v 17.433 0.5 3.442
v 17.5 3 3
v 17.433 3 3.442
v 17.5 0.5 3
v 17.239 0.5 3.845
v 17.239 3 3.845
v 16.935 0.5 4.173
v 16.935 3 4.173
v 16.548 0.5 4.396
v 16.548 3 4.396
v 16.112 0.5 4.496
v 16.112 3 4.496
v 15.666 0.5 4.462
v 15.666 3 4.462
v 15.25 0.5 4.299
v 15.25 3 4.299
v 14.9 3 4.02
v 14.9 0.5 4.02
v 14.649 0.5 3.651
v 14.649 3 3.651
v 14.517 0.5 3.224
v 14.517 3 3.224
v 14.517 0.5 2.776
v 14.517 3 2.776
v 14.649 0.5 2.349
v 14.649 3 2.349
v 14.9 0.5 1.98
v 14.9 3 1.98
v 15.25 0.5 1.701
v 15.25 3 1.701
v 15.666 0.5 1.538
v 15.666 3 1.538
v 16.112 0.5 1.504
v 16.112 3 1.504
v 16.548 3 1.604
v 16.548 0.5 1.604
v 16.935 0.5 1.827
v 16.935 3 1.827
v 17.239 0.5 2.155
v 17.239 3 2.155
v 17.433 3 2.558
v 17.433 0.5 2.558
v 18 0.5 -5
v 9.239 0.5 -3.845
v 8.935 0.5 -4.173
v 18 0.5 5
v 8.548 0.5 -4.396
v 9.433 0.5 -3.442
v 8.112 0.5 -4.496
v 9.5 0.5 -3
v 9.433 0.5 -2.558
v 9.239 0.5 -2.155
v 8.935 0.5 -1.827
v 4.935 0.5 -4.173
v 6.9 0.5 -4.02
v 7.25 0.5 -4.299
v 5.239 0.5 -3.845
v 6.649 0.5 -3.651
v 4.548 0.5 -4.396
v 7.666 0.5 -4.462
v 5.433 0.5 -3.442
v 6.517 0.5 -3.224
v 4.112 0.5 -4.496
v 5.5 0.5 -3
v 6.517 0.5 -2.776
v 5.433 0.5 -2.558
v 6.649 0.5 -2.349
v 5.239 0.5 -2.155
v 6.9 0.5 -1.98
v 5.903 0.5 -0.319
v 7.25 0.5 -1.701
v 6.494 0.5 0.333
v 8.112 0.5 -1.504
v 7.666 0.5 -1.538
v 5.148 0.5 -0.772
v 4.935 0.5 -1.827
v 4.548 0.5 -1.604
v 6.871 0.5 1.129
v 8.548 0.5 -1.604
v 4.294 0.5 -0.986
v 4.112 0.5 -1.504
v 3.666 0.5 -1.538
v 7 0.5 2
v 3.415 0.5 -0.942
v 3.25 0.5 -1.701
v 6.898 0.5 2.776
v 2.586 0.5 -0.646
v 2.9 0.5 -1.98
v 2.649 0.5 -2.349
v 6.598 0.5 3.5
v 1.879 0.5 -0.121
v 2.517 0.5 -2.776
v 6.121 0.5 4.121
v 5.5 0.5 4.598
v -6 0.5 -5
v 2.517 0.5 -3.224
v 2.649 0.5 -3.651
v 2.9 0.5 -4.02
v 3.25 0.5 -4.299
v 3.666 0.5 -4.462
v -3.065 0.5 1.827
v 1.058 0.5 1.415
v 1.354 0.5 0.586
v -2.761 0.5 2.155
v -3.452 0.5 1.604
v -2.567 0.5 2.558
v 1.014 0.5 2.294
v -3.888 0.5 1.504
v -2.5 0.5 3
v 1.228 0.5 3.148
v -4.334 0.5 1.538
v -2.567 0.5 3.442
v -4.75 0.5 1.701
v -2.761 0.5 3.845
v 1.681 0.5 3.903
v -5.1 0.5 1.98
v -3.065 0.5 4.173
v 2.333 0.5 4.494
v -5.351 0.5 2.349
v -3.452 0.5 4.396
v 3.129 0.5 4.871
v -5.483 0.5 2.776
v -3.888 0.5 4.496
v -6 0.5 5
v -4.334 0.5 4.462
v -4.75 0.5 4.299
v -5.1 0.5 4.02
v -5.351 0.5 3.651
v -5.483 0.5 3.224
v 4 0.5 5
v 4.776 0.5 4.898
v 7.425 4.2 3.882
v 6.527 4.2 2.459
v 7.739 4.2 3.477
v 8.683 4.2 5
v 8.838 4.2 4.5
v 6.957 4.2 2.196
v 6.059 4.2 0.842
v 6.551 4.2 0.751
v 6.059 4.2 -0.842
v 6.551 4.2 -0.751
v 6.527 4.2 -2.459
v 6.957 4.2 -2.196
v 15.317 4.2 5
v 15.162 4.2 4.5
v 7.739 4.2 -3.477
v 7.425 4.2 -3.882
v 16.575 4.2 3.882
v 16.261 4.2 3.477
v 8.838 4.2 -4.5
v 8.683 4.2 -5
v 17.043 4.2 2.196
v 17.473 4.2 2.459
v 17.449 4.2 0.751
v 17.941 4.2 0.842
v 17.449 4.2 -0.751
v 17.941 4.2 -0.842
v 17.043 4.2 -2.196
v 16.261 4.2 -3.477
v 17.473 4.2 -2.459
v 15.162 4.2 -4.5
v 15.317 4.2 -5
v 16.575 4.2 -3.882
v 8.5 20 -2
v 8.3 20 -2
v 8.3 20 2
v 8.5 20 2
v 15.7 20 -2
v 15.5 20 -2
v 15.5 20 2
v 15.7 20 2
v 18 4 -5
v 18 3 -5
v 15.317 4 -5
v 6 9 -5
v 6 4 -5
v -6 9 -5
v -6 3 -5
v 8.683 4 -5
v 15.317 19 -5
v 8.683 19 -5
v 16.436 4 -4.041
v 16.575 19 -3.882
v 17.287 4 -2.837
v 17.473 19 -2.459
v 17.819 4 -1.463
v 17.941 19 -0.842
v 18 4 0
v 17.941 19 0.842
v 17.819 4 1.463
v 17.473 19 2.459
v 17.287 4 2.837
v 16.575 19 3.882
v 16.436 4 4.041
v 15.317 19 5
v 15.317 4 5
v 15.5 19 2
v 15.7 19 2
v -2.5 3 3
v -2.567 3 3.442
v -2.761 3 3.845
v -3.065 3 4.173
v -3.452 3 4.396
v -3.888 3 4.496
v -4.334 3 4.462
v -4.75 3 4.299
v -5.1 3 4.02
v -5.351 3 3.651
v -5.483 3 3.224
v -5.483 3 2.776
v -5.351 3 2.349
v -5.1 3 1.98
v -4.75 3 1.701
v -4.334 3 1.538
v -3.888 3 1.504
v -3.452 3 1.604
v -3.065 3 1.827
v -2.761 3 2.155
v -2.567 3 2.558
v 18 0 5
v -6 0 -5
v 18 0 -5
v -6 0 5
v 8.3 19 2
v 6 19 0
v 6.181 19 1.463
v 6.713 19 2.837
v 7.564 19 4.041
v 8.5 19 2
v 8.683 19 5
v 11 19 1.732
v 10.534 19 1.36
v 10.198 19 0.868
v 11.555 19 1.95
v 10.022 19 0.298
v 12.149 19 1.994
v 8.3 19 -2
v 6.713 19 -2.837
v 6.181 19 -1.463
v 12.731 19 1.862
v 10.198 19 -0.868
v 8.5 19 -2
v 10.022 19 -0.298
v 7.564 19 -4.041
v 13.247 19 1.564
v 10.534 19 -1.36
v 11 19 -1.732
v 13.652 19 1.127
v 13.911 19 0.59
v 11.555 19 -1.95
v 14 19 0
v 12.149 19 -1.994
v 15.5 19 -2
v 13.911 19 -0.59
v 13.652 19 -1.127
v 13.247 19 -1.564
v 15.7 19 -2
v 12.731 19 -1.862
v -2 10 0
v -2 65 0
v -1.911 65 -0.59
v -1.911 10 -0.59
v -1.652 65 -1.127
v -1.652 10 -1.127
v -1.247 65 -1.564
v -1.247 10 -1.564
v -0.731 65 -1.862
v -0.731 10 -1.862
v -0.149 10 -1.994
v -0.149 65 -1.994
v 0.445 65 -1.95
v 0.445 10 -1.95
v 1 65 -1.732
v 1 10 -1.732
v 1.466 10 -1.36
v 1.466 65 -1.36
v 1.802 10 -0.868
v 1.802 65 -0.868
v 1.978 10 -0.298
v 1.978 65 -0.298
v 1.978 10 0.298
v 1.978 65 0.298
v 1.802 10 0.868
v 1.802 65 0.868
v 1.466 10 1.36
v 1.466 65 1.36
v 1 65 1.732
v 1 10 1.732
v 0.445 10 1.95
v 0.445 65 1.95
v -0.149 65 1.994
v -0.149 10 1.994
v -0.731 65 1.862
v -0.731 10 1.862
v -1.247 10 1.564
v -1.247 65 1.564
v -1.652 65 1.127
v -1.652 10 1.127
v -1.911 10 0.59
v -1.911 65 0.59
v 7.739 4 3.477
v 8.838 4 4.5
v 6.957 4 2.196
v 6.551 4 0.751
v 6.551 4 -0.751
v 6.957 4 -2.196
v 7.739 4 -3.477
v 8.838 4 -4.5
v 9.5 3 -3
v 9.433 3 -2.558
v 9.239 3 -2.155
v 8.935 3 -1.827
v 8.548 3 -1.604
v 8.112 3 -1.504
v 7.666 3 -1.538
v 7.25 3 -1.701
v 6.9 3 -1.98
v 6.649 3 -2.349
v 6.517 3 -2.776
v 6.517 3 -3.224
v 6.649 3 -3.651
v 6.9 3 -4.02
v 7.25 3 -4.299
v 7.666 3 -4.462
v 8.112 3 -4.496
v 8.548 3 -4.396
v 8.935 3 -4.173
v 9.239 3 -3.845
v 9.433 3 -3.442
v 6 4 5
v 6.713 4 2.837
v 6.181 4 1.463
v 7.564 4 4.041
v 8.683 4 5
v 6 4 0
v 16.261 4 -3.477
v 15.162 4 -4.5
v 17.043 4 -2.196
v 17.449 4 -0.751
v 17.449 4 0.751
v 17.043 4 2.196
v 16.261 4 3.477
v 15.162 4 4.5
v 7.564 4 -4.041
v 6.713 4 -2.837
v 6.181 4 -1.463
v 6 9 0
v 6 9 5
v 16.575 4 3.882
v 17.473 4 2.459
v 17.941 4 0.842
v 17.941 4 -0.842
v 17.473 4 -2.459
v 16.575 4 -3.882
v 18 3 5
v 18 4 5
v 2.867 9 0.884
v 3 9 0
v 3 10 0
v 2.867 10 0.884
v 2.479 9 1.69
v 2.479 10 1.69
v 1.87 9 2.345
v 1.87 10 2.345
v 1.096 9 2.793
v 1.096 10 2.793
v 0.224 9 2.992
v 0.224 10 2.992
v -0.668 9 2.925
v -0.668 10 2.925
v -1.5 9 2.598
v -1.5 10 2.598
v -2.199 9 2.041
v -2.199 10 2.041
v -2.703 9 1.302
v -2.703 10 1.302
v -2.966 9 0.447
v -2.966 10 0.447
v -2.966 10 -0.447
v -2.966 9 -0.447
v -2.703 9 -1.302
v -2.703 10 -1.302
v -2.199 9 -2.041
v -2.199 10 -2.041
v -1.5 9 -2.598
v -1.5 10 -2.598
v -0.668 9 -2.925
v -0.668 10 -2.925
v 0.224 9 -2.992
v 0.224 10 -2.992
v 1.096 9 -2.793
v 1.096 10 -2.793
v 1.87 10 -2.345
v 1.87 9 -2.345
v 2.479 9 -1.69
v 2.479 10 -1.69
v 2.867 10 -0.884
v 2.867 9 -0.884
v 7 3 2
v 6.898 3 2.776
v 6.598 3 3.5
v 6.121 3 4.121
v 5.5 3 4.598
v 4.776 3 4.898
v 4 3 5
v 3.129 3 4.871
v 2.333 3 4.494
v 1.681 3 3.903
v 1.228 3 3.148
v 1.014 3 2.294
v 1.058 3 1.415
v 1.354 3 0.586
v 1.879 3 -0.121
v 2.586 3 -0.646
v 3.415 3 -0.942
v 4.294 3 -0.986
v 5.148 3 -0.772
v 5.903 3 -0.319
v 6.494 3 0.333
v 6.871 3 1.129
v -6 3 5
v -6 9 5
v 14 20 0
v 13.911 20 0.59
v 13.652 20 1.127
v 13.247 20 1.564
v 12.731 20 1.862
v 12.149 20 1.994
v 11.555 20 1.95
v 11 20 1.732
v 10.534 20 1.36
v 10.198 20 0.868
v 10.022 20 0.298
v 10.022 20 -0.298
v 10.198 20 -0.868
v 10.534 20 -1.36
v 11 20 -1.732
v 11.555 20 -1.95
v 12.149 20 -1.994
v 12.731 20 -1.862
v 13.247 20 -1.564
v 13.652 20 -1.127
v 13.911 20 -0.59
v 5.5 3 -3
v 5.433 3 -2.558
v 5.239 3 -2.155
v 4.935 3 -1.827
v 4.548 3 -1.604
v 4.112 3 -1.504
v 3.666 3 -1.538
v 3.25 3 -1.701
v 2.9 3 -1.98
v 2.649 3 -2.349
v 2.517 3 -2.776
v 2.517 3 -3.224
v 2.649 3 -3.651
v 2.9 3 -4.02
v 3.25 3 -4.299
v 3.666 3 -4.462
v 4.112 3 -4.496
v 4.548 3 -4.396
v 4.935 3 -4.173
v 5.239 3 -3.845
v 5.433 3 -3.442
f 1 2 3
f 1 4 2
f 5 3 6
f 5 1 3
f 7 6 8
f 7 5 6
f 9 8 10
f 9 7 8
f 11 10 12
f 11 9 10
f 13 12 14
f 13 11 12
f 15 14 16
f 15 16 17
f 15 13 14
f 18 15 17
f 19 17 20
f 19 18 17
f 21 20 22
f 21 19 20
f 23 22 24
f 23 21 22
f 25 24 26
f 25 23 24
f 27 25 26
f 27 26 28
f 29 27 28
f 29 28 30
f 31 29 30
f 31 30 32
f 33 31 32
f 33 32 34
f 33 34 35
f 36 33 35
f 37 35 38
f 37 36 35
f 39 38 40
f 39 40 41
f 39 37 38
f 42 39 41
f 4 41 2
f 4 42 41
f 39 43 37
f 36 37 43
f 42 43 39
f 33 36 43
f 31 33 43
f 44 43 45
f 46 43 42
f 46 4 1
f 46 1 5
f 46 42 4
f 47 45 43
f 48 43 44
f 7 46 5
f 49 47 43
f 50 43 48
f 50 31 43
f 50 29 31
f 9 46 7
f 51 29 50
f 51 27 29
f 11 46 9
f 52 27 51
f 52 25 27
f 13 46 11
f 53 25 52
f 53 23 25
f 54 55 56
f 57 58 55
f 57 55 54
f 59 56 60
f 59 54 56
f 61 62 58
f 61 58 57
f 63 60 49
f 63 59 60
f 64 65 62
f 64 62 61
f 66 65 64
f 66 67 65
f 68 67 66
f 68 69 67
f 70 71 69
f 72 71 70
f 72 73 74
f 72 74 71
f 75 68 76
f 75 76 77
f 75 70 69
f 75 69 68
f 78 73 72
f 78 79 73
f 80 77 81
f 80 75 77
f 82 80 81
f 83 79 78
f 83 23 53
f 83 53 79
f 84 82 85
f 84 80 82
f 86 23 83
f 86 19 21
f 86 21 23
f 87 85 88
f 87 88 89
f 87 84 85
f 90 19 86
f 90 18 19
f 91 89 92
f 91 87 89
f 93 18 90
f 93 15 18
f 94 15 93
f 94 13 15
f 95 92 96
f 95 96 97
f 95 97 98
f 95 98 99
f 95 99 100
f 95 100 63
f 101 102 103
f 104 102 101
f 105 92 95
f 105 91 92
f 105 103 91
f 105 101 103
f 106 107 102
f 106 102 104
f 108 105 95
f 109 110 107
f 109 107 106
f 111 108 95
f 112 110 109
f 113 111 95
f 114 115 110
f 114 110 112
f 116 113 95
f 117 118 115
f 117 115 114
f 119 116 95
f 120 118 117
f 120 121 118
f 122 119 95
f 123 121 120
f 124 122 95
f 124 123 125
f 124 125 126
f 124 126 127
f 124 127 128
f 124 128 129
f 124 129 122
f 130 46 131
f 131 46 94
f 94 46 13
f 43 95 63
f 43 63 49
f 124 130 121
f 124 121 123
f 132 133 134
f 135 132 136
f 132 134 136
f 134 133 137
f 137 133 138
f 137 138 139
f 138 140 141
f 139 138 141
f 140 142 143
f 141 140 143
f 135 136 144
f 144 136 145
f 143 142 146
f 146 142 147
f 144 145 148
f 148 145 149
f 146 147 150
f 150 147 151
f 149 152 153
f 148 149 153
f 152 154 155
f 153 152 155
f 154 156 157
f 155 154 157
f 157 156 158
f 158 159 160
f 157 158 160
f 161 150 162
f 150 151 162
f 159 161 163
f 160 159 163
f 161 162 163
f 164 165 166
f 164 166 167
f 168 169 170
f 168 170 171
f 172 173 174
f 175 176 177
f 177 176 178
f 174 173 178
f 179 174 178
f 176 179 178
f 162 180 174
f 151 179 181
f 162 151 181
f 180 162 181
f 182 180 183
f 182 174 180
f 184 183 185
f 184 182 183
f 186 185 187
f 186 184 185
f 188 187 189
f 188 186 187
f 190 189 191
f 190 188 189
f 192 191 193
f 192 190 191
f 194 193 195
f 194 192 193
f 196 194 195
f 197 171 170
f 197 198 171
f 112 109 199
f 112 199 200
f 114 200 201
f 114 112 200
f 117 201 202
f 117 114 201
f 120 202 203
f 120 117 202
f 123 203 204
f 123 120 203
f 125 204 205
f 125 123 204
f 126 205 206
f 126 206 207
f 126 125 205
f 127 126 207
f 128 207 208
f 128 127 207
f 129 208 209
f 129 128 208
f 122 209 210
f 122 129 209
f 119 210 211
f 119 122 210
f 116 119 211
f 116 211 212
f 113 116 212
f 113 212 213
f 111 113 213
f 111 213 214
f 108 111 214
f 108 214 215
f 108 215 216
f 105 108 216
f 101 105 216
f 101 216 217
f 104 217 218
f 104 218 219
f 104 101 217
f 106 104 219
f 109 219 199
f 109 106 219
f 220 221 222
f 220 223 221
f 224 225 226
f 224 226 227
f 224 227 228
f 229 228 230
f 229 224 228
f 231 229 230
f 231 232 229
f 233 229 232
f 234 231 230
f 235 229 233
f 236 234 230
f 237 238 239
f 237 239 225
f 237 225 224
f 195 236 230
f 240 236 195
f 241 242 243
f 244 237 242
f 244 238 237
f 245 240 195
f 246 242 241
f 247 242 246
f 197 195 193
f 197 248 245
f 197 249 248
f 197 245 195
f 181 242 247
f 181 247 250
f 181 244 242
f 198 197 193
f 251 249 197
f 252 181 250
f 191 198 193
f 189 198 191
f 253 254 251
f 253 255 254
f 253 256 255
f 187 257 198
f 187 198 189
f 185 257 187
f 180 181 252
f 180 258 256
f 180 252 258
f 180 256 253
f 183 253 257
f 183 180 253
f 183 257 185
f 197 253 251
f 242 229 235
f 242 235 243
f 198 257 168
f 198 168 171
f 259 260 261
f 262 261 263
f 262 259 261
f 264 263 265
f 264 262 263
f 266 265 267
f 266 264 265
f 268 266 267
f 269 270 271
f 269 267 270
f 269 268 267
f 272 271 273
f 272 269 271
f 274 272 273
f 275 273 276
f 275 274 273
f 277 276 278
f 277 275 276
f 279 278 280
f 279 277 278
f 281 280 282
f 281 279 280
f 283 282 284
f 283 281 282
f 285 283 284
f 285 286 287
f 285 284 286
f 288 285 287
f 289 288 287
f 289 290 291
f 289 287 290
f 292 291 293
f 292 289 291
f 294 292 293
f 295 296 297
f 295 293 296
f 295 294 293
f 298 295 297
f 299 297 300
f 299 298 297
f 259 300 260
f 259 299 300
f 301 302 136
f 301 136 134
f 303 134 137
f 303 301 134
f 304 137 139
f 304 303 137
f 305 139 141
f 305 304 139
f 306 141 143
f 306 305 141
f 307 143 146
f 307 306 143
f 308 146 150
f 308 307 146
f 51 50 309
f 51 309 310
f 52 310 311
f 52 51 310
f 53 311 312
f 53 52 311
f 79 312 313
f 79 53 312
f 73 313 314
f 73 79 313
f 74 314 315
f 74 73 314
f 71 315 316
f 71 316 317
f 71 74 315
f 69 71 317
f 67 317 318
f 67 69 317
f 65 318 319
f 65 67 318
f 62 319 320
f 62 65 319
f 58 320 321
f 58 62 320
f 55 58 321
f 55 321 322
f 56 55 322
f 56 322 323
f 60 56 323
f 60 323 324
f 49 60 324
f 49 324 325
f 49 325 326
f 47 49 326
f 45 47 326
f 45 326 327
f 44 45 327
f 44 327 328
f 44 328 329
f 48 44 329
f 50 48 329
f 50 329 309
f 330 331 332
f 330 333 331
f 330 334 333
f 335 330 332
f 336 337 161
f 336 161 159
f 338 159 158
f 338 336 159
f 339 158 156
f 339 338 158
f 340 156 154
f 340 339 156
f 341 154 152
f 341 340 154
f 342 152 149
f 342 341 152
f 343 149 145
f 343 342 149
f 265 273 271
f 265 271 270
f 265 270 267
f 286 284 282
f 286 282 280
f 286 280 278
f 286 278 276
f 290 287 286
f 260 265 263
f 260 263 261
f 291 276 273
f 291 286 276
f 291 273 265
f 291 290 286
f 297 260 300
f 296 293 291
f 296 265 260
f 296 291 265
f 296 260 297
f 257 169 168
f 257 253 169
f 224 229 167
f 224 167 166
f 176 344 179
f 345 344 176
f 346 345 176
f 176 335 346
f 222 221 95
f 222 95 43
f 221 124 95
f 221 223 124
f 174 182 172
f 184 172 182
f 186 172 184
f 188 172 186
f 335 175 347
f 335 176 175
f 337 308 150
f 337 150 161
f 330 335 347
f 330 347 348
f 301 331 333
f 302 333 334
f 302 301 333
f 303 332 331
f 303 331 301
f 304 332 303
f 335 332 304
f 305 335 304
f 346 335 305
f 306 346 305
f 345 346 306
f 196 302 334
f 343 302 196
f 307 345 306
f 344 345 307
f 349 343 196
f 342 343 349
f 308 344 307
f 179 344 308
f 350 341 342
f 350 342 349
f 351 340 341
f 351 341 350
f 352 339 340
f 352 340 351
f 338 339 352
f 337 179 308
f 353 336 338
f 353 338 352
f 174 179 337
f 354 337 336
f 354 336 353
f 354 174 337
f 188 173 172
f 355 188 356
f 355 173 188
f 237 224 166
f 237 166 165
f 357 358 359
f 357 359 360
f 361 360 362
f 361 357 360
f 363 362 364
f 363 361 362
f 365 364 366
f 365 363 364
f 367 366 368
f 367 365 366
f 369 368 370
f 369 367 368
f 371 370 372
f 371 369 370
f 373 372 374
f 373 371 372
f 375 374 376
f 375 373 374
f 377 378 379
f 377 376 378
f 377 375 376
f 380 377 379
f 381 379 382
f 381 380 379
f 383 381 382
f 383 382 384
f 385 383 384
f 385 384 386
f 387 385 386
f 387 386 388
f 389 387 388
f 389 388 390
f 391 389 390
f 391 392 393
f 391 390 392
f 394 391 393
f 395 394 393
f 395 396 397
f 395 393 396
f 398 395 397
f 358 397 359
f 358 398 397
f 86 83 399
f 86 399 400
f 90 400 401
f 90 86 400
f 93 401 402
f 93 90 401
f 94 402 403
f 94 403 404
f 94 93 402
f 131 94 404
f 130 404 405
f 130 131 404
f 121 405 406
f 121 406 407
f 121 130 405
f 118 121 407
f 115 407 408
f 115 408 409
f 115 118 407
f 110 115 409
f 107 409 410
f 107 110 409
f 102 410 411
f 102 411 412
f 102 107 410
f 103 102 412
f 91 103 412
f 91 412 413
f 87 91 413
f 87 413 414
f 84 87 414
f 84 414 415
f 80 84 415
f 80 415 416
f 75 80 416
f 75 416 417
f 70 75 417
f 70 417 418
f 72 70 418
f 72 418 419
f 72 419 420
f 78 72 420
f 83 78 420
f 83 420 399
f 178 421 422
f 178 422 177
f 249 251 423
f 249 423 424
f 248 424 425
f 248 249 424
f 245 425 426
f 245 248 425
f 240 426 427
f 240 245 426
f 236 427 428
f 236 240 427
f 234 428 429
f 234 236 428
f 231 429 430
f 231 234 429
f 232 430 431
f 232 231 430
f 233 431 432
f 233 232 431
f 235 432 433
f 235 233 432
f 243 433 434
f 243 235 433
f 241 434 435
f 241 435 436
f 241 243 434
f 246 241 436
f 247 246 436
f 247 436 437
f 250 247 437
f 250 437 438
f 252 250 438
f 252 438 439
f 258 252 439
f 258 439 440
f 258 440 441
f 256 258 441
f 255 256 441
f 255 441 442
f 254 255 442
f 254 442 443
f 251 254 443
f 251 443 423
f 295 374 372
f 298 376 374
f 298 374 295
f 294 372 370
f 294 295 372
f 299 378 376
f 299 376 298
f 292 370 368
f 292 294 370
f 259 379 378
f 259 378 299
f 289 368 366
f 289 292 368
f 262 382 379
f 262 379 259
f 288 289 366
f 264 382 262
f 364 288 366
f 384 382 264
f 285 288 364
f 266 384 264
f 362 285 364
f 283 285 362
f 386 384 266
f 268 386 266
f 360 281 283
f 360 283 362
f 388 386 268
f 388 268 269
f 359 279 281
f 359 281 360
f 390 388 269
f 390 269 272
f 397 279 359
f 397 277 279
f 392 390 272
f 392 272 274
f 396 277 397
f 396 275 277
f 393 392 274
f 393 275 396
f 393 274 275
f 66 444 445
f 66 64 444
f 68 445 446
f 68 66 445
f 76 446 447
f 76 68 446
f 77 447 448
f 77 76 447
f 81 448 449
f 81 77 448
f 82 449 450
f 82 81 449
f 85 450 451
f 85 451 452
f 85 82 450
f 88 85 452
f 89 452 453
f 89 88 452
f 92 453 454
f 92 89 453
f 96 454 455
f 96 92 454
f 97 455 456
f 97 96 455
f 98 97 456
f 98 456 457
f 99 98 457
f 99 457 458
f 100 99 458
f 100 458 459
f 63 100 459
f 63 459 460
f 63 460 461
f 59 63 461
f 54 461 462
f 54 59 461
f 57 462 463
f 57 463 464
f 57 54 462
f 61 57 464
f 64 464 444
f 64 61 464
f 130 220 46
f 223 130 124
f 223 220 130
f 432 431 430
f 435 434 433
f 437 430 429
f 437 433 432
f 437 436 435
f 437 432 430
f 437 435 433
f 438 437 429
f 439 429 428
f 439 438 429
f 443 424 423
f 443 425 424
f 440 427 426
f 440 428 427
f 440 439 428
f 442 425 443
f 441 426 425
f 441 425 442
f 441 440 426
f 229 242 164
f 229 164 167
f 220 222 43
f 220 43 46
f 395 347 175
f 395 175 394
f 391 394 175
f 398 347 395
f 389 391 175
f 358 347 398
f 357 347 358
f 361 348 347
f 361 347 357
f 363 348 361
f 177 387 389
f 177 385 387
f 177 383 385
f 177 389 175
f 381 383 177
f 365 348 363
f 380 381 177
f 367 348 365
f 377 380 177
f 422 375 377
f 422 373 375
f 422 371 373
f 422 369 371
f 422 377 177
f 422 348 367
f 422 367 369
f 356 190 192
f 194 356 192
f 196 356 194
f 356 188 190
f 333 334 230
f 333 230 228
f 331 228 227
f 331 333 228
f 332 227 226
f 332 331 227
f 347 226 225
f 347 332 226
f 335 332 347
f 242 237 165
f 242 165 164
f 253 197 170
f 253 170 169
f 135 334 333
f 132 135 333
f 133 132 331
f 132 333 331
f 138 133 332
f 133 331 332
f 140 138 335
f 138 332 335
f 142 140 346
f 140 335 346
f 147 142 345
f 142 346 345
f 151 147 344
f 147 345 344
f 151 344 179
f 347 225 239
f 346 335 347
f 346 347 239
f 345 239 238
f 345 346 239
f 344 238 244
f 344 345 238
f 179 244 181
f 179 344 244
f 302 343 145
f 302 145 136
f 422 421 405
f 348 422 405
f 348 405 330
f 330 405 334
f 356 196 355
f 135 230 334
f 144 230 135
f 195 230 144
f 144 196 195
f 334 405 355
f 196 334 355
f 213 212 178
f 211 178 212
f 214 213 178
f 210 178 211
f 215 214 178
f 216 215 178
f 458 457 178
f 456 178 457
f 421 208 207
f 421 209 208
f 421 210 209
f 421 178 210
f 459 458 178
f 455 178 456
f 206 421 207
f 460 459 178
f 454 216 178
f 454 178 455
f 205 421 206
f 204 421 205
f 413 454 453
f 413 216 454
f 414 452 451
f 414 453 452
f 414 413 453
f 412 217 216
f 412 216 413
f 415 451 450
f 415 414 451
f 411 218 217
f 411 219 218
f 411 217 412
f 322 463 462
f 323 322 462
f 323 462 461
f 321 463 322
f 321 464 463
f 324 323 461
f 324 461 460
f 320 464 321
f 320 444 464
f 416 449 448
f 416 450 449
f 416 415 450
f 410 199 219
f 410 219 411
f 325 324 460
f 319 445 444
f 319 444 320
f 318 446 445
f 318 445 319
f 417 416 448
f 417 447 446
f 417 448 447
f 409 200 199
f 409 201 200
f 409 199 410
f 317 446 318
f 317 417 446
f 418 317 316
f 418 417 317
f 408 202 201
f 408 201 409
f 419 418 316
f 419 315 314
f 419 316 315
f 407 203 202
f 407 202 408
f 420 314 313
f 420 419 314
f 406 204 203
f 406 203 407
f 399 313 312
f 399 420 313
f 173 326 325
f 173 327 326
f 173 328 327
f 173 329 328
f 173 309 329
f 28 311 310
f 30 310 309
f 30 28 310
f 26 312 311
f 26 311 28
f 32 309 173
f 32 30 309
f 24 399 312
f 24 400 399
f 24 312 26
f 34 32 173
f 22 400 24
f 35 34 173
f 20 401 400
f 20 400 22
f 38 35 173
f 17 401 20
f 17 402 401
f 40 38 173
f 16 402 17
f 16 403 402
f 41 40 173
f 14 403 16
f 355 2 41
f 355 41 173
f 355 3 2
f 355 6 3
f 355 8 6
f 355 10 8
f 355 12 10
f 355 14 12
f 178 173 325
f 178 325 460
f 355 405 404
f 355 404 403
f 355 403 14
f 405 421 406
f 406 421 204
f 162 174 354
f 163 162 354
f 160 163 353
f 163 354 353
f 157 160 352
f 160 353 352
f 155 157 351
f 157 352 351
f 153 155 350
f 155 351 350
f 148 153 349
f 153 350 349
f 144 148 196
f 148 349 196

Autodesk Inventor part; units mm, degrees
ref_plane "YZ Plane" through (0, 0, 0) normal (1, 0, 0) x (0, 1, 0)
ref_plane "XZ Plane" through (0, 0, 0) normal (0, 1, 0) x (-1, 0, 0)
ref_plane "XY Plane" through (0, 0, 0) normal (0, 0, 1) x (1, 0, 0)
sketch "スケッチ2" plane through (0, 0, 0) normal (0, 1, 0) x (-1, 0, 0)
  circle A0 centre (0, 0) radius 2
  line L0 (-6, 5) -> (6, 5)
  line L1 (6, 5) -> (6, -5)
  line L2 (6, -5) -> (-6, -5)
  line L3 (-6, -5) -> (-6, 5)
  line L4 (-6, 5) -> (6, -5) construction
  line L5 (6, 5) -> (-6, -5) construction
  line L6 (-18, 5) -> (-6, 5)
  line L7 (-6, 5) -> (-6, -5)
  line L8 (-6, -5) -> (-18, -5)
  line L9 (-18, -5) -> (-18, 5)
  line L10 (-18, 5) -> (-6, -5) construction
  line L11 (-6, 5) -> (-18, -5) construction
  point P0 (-12, 0)
  dimension "d0" = 4
  dimension "d1" = 12
  dimension "d2" = 10
  dimension "d3" = 12
extrude "押し出し1" add sketch "スケッチ2" along normal blind 4 contours A0 | L0 L1 L2 L3 | L3 L8 L9 L6
extrude "押し出し2" add sketch "スケッチ2" along normal blind 9 contours A0 | L0 L1 L2 L3
extrude "押し出し3" add sketch "スケッチ2" along normal blind 65 contours A0
sketch "スケッチ3" plane through (0, 9, 0) normal (0, 1, 0) x (1, 0, 0)
  circle A0 centre (0, 0) radius 2 projected
  circle A1 centre (0, 0) radius 3
  dimension "d10" = 6
extrude "押し出し4" add sketch "スケッチ3" along normal blind 1 contours A0 | A1
sketch "スケッチ4" plane through (0, 4, 0) normal (0, 1, 0) x (1, 0, 0)
  circle A0 centre (12, 0) radius 6
  line L0 (18, -5) -> (18, 5) projected
  line L1 (6, -5) -> (6, 5) projected
  line L2 (6, 5) -> (6, -5) projected
  line L3 (6, -5) -> (18, -5) projected
  line L4 (18, -5) -> (18, 5) projected
  line L5 (18, 5) -> (6, 5) projected
  point P0 (0, 0)
  point P1 (15.3166, 5)
  point P2 (8.6834, 5)
  point P3 (8.6834, -5)
  point P4 (15.3166, -5)
extrude "押し出し5" add sketch "スケッチ4" along normal blind 15 contours A0 L3 L5
sketch "スケッチ5" plane through (0, 19, 0) normal (0, 1, 0) x (1, 0, 0)
  arc A0 (8.6834, 5) -> (8.6834, -5) centre (12, 0) ccw projected
  circle A1 centre (12, 0) radius 2
  line L0 (8.3, 2) -> (8.5, 2)
  line L1 (8.5, 2) -> (8.5, -2)
  line L2 (8.5, -2) -> (8.3, -2)
  line L3 (8.3, -2) -> (8.3, 2)
  line L4 (15.5, 2) -> (15.7, 2)
  line L5 (15.7, 2) -> (15.7, -2)
  line L6 (15.7, -2) -> (15.5, -2)
  line L7 (15.5, -2) -> (15.5, 2)
  line L8 (15.3166, 5) -> (8.6834, 5) projected
  line L9 (12, 5) -> (12, 0)
  line L10 (-6, -5) -> (18, -5) projected
  point P0 (0, 0)
  point P1 (8.5, 0)
  point P2 (15.5, 0)
  dimension "d15" = 4
  dimension "d16" = 0.2
  dimension "d17" = 3.5
extrude "押し出し6" add sketch "スケッチ5" along normal blind 1
sketch "スケッチ6" plane through (0, 4, 0) normal (0, 1, 0) x (1, 0, 0)
  line L0 (15.5, -2) -> (15.5, 2) projected
  line L1 (15.5, 2) -> (15.7, 2) projected
  line L2 (15.7, 2) -> (15.7, -2) projected
  line L3 (15.7, -2) -> (15.5, -2) projected
  line L4 (8.3, -2) -> (8.3, 2) projected
  line L5 (8.3, 2) -> (8.5, 2) projected
  line L6 (8.5, 2) -> (8.5, -2) projected
  line L7 (8.5, -2) -> (8.3, -2) projected
  circle A0 centre (12, 0) radius 2 projected
  arc A1 (8.6834, 5) -> (8.6834, -5) centre (12, 0) ccw projected
  line L8 (8.6834, -5) -> (15.3166, -5) projected
  arc A2 (15.3166, -5) -> (15.3166, 5) centre (12, 0) ccw projected
  line L9 (15.3166, 5) -> (8.6834, 5) projected
  circle A3 centre (12, 0) radius 5.5
  line L10 (15.1623, -4.5) -> (8.8377, -4.5)
  line L11 (8.8377, -4.5) -> (8.8377, 4.5)
  line L12 (8.8377, 4.5) -> (15.1623, 4.5)
  line L13 (15.1623, 4.5) -> (15.1623, -4.5)
  line L14 (15.1623, -4.5) -> (8.8377, 4.5) construction
  line L15 (8.8377, -4.5) -> (15.1623, 4.5) construction
  point P0 (0, 0)
  dimension "d20" = 11
  dimension "d21" = 9
extrude "押し出し7" cut sketch "スケッチ6" along normal blind 0.2 contours L9 A3 L8 A1 | L9 A3 L12 | A3 L10 L8 | L9 A2 L8 A3
sketch "スケッチ7" plane through (0, 0, 0) normal (0, -1, 0) x (1, 0, 0)
  line L0 (17.5, -4.5) -> (-5.5, -4.5)
  line L1 (-5.5, -4.5) -> (-5.5, 4.5)
  line L2 (-5.5, 4.5) -> (17.5, 4.5)
  line L3 (17.5, 4.5) -> (17.5, -4.5)
  line L4 (6, -5) -> (6, 5) projected
  line L5 (17.5, -4.5) -> (-5.5, 4.5) construction
  line L6 (-5.5, -4.5) -> (17.5, 4.5) construction
  line L7 (-6, -5) -> (-6, 5) projected
  line L8 (18, -5) -> (-6, -5) projected
  circle A0 centre (8, -3) radius 1.5
  circle A1 centre (16, 3) radius 1.5
  circle A2 centre (4, -3) radius 1.5
  circle A3 centre (-4, 3) radius 1.5
  line L9 (5.5, 4.5) -> (6.5, 4.5)
  line L10 (6.5, 4.5) -> (6.5, -4.5)
  line L11 (6.5, -4.5) -> (5.5, -4.5)
  line L12 (5.5, -4.5) -> (5.5, 4.5)
  line L13 (5.5, 4.5) -> (6.5, -4.5) construction
  line L14 (6.5, 4.5) -> (5.5, -4.5) construction
  line L15 (18, -5) -> (-6, -5) projected
  line L16 (18, 5) -> (18, -5) projected
  line L17 (-6, 5) -> (18, 5) projected
  line L18 (-6, -5) -> (-6, 5) projected
  point P0 (0, 0)
  point P1 (6, 0)
  dimension "d24" = 23
  dimension "d25" = 0.5
  dimension "d26" = 0.5
  dimension "d27" = 3
  dimension "d31" = 1
extrude "押し出し8" cut sketch "スケッチ7" against normal blind 3 contours L3 L2 L4 L17 L16 L8 L0 | L0 A0 L10 L2 A1 L3 | L0 L10 A0 | A1 L2 L3 | L0 L4 L2 L10 | L4 L8 L7 L17 L2 L1 L0 | L0 L12 L2 L4 | L0 A2 L12 | L0 L1 A3 L2 L12 A2 | A3 L1 L2
extrude "押し出し9" add sketch "スケッチ2" along normal blind 0.5 contours A0 | L0 L1 L2 L3 | L3 L8 L9 L6
sketch "スケッチ9" plane through (0, 0, 0) normal (0, -1, 0) x (1, 0, 0)
  circle A0 centre (4, -3) radius 1.5 projected
  circle A1 centre (4, -3) radius 1.5 projected
  circle A2 centre (4, 2) radius 3
  line L0 (-6, 5) -> (18, 5) projected
  point P0 (0, 0)
  dimension "d38" = 6
extrude "押し出し10" add sketch "スケッチ9" against normal up to surface (3 mm away) contours A2
equation "\"d26\" = d25"
properties part number "motor_M4_55" material "アルミニウム 6061"
